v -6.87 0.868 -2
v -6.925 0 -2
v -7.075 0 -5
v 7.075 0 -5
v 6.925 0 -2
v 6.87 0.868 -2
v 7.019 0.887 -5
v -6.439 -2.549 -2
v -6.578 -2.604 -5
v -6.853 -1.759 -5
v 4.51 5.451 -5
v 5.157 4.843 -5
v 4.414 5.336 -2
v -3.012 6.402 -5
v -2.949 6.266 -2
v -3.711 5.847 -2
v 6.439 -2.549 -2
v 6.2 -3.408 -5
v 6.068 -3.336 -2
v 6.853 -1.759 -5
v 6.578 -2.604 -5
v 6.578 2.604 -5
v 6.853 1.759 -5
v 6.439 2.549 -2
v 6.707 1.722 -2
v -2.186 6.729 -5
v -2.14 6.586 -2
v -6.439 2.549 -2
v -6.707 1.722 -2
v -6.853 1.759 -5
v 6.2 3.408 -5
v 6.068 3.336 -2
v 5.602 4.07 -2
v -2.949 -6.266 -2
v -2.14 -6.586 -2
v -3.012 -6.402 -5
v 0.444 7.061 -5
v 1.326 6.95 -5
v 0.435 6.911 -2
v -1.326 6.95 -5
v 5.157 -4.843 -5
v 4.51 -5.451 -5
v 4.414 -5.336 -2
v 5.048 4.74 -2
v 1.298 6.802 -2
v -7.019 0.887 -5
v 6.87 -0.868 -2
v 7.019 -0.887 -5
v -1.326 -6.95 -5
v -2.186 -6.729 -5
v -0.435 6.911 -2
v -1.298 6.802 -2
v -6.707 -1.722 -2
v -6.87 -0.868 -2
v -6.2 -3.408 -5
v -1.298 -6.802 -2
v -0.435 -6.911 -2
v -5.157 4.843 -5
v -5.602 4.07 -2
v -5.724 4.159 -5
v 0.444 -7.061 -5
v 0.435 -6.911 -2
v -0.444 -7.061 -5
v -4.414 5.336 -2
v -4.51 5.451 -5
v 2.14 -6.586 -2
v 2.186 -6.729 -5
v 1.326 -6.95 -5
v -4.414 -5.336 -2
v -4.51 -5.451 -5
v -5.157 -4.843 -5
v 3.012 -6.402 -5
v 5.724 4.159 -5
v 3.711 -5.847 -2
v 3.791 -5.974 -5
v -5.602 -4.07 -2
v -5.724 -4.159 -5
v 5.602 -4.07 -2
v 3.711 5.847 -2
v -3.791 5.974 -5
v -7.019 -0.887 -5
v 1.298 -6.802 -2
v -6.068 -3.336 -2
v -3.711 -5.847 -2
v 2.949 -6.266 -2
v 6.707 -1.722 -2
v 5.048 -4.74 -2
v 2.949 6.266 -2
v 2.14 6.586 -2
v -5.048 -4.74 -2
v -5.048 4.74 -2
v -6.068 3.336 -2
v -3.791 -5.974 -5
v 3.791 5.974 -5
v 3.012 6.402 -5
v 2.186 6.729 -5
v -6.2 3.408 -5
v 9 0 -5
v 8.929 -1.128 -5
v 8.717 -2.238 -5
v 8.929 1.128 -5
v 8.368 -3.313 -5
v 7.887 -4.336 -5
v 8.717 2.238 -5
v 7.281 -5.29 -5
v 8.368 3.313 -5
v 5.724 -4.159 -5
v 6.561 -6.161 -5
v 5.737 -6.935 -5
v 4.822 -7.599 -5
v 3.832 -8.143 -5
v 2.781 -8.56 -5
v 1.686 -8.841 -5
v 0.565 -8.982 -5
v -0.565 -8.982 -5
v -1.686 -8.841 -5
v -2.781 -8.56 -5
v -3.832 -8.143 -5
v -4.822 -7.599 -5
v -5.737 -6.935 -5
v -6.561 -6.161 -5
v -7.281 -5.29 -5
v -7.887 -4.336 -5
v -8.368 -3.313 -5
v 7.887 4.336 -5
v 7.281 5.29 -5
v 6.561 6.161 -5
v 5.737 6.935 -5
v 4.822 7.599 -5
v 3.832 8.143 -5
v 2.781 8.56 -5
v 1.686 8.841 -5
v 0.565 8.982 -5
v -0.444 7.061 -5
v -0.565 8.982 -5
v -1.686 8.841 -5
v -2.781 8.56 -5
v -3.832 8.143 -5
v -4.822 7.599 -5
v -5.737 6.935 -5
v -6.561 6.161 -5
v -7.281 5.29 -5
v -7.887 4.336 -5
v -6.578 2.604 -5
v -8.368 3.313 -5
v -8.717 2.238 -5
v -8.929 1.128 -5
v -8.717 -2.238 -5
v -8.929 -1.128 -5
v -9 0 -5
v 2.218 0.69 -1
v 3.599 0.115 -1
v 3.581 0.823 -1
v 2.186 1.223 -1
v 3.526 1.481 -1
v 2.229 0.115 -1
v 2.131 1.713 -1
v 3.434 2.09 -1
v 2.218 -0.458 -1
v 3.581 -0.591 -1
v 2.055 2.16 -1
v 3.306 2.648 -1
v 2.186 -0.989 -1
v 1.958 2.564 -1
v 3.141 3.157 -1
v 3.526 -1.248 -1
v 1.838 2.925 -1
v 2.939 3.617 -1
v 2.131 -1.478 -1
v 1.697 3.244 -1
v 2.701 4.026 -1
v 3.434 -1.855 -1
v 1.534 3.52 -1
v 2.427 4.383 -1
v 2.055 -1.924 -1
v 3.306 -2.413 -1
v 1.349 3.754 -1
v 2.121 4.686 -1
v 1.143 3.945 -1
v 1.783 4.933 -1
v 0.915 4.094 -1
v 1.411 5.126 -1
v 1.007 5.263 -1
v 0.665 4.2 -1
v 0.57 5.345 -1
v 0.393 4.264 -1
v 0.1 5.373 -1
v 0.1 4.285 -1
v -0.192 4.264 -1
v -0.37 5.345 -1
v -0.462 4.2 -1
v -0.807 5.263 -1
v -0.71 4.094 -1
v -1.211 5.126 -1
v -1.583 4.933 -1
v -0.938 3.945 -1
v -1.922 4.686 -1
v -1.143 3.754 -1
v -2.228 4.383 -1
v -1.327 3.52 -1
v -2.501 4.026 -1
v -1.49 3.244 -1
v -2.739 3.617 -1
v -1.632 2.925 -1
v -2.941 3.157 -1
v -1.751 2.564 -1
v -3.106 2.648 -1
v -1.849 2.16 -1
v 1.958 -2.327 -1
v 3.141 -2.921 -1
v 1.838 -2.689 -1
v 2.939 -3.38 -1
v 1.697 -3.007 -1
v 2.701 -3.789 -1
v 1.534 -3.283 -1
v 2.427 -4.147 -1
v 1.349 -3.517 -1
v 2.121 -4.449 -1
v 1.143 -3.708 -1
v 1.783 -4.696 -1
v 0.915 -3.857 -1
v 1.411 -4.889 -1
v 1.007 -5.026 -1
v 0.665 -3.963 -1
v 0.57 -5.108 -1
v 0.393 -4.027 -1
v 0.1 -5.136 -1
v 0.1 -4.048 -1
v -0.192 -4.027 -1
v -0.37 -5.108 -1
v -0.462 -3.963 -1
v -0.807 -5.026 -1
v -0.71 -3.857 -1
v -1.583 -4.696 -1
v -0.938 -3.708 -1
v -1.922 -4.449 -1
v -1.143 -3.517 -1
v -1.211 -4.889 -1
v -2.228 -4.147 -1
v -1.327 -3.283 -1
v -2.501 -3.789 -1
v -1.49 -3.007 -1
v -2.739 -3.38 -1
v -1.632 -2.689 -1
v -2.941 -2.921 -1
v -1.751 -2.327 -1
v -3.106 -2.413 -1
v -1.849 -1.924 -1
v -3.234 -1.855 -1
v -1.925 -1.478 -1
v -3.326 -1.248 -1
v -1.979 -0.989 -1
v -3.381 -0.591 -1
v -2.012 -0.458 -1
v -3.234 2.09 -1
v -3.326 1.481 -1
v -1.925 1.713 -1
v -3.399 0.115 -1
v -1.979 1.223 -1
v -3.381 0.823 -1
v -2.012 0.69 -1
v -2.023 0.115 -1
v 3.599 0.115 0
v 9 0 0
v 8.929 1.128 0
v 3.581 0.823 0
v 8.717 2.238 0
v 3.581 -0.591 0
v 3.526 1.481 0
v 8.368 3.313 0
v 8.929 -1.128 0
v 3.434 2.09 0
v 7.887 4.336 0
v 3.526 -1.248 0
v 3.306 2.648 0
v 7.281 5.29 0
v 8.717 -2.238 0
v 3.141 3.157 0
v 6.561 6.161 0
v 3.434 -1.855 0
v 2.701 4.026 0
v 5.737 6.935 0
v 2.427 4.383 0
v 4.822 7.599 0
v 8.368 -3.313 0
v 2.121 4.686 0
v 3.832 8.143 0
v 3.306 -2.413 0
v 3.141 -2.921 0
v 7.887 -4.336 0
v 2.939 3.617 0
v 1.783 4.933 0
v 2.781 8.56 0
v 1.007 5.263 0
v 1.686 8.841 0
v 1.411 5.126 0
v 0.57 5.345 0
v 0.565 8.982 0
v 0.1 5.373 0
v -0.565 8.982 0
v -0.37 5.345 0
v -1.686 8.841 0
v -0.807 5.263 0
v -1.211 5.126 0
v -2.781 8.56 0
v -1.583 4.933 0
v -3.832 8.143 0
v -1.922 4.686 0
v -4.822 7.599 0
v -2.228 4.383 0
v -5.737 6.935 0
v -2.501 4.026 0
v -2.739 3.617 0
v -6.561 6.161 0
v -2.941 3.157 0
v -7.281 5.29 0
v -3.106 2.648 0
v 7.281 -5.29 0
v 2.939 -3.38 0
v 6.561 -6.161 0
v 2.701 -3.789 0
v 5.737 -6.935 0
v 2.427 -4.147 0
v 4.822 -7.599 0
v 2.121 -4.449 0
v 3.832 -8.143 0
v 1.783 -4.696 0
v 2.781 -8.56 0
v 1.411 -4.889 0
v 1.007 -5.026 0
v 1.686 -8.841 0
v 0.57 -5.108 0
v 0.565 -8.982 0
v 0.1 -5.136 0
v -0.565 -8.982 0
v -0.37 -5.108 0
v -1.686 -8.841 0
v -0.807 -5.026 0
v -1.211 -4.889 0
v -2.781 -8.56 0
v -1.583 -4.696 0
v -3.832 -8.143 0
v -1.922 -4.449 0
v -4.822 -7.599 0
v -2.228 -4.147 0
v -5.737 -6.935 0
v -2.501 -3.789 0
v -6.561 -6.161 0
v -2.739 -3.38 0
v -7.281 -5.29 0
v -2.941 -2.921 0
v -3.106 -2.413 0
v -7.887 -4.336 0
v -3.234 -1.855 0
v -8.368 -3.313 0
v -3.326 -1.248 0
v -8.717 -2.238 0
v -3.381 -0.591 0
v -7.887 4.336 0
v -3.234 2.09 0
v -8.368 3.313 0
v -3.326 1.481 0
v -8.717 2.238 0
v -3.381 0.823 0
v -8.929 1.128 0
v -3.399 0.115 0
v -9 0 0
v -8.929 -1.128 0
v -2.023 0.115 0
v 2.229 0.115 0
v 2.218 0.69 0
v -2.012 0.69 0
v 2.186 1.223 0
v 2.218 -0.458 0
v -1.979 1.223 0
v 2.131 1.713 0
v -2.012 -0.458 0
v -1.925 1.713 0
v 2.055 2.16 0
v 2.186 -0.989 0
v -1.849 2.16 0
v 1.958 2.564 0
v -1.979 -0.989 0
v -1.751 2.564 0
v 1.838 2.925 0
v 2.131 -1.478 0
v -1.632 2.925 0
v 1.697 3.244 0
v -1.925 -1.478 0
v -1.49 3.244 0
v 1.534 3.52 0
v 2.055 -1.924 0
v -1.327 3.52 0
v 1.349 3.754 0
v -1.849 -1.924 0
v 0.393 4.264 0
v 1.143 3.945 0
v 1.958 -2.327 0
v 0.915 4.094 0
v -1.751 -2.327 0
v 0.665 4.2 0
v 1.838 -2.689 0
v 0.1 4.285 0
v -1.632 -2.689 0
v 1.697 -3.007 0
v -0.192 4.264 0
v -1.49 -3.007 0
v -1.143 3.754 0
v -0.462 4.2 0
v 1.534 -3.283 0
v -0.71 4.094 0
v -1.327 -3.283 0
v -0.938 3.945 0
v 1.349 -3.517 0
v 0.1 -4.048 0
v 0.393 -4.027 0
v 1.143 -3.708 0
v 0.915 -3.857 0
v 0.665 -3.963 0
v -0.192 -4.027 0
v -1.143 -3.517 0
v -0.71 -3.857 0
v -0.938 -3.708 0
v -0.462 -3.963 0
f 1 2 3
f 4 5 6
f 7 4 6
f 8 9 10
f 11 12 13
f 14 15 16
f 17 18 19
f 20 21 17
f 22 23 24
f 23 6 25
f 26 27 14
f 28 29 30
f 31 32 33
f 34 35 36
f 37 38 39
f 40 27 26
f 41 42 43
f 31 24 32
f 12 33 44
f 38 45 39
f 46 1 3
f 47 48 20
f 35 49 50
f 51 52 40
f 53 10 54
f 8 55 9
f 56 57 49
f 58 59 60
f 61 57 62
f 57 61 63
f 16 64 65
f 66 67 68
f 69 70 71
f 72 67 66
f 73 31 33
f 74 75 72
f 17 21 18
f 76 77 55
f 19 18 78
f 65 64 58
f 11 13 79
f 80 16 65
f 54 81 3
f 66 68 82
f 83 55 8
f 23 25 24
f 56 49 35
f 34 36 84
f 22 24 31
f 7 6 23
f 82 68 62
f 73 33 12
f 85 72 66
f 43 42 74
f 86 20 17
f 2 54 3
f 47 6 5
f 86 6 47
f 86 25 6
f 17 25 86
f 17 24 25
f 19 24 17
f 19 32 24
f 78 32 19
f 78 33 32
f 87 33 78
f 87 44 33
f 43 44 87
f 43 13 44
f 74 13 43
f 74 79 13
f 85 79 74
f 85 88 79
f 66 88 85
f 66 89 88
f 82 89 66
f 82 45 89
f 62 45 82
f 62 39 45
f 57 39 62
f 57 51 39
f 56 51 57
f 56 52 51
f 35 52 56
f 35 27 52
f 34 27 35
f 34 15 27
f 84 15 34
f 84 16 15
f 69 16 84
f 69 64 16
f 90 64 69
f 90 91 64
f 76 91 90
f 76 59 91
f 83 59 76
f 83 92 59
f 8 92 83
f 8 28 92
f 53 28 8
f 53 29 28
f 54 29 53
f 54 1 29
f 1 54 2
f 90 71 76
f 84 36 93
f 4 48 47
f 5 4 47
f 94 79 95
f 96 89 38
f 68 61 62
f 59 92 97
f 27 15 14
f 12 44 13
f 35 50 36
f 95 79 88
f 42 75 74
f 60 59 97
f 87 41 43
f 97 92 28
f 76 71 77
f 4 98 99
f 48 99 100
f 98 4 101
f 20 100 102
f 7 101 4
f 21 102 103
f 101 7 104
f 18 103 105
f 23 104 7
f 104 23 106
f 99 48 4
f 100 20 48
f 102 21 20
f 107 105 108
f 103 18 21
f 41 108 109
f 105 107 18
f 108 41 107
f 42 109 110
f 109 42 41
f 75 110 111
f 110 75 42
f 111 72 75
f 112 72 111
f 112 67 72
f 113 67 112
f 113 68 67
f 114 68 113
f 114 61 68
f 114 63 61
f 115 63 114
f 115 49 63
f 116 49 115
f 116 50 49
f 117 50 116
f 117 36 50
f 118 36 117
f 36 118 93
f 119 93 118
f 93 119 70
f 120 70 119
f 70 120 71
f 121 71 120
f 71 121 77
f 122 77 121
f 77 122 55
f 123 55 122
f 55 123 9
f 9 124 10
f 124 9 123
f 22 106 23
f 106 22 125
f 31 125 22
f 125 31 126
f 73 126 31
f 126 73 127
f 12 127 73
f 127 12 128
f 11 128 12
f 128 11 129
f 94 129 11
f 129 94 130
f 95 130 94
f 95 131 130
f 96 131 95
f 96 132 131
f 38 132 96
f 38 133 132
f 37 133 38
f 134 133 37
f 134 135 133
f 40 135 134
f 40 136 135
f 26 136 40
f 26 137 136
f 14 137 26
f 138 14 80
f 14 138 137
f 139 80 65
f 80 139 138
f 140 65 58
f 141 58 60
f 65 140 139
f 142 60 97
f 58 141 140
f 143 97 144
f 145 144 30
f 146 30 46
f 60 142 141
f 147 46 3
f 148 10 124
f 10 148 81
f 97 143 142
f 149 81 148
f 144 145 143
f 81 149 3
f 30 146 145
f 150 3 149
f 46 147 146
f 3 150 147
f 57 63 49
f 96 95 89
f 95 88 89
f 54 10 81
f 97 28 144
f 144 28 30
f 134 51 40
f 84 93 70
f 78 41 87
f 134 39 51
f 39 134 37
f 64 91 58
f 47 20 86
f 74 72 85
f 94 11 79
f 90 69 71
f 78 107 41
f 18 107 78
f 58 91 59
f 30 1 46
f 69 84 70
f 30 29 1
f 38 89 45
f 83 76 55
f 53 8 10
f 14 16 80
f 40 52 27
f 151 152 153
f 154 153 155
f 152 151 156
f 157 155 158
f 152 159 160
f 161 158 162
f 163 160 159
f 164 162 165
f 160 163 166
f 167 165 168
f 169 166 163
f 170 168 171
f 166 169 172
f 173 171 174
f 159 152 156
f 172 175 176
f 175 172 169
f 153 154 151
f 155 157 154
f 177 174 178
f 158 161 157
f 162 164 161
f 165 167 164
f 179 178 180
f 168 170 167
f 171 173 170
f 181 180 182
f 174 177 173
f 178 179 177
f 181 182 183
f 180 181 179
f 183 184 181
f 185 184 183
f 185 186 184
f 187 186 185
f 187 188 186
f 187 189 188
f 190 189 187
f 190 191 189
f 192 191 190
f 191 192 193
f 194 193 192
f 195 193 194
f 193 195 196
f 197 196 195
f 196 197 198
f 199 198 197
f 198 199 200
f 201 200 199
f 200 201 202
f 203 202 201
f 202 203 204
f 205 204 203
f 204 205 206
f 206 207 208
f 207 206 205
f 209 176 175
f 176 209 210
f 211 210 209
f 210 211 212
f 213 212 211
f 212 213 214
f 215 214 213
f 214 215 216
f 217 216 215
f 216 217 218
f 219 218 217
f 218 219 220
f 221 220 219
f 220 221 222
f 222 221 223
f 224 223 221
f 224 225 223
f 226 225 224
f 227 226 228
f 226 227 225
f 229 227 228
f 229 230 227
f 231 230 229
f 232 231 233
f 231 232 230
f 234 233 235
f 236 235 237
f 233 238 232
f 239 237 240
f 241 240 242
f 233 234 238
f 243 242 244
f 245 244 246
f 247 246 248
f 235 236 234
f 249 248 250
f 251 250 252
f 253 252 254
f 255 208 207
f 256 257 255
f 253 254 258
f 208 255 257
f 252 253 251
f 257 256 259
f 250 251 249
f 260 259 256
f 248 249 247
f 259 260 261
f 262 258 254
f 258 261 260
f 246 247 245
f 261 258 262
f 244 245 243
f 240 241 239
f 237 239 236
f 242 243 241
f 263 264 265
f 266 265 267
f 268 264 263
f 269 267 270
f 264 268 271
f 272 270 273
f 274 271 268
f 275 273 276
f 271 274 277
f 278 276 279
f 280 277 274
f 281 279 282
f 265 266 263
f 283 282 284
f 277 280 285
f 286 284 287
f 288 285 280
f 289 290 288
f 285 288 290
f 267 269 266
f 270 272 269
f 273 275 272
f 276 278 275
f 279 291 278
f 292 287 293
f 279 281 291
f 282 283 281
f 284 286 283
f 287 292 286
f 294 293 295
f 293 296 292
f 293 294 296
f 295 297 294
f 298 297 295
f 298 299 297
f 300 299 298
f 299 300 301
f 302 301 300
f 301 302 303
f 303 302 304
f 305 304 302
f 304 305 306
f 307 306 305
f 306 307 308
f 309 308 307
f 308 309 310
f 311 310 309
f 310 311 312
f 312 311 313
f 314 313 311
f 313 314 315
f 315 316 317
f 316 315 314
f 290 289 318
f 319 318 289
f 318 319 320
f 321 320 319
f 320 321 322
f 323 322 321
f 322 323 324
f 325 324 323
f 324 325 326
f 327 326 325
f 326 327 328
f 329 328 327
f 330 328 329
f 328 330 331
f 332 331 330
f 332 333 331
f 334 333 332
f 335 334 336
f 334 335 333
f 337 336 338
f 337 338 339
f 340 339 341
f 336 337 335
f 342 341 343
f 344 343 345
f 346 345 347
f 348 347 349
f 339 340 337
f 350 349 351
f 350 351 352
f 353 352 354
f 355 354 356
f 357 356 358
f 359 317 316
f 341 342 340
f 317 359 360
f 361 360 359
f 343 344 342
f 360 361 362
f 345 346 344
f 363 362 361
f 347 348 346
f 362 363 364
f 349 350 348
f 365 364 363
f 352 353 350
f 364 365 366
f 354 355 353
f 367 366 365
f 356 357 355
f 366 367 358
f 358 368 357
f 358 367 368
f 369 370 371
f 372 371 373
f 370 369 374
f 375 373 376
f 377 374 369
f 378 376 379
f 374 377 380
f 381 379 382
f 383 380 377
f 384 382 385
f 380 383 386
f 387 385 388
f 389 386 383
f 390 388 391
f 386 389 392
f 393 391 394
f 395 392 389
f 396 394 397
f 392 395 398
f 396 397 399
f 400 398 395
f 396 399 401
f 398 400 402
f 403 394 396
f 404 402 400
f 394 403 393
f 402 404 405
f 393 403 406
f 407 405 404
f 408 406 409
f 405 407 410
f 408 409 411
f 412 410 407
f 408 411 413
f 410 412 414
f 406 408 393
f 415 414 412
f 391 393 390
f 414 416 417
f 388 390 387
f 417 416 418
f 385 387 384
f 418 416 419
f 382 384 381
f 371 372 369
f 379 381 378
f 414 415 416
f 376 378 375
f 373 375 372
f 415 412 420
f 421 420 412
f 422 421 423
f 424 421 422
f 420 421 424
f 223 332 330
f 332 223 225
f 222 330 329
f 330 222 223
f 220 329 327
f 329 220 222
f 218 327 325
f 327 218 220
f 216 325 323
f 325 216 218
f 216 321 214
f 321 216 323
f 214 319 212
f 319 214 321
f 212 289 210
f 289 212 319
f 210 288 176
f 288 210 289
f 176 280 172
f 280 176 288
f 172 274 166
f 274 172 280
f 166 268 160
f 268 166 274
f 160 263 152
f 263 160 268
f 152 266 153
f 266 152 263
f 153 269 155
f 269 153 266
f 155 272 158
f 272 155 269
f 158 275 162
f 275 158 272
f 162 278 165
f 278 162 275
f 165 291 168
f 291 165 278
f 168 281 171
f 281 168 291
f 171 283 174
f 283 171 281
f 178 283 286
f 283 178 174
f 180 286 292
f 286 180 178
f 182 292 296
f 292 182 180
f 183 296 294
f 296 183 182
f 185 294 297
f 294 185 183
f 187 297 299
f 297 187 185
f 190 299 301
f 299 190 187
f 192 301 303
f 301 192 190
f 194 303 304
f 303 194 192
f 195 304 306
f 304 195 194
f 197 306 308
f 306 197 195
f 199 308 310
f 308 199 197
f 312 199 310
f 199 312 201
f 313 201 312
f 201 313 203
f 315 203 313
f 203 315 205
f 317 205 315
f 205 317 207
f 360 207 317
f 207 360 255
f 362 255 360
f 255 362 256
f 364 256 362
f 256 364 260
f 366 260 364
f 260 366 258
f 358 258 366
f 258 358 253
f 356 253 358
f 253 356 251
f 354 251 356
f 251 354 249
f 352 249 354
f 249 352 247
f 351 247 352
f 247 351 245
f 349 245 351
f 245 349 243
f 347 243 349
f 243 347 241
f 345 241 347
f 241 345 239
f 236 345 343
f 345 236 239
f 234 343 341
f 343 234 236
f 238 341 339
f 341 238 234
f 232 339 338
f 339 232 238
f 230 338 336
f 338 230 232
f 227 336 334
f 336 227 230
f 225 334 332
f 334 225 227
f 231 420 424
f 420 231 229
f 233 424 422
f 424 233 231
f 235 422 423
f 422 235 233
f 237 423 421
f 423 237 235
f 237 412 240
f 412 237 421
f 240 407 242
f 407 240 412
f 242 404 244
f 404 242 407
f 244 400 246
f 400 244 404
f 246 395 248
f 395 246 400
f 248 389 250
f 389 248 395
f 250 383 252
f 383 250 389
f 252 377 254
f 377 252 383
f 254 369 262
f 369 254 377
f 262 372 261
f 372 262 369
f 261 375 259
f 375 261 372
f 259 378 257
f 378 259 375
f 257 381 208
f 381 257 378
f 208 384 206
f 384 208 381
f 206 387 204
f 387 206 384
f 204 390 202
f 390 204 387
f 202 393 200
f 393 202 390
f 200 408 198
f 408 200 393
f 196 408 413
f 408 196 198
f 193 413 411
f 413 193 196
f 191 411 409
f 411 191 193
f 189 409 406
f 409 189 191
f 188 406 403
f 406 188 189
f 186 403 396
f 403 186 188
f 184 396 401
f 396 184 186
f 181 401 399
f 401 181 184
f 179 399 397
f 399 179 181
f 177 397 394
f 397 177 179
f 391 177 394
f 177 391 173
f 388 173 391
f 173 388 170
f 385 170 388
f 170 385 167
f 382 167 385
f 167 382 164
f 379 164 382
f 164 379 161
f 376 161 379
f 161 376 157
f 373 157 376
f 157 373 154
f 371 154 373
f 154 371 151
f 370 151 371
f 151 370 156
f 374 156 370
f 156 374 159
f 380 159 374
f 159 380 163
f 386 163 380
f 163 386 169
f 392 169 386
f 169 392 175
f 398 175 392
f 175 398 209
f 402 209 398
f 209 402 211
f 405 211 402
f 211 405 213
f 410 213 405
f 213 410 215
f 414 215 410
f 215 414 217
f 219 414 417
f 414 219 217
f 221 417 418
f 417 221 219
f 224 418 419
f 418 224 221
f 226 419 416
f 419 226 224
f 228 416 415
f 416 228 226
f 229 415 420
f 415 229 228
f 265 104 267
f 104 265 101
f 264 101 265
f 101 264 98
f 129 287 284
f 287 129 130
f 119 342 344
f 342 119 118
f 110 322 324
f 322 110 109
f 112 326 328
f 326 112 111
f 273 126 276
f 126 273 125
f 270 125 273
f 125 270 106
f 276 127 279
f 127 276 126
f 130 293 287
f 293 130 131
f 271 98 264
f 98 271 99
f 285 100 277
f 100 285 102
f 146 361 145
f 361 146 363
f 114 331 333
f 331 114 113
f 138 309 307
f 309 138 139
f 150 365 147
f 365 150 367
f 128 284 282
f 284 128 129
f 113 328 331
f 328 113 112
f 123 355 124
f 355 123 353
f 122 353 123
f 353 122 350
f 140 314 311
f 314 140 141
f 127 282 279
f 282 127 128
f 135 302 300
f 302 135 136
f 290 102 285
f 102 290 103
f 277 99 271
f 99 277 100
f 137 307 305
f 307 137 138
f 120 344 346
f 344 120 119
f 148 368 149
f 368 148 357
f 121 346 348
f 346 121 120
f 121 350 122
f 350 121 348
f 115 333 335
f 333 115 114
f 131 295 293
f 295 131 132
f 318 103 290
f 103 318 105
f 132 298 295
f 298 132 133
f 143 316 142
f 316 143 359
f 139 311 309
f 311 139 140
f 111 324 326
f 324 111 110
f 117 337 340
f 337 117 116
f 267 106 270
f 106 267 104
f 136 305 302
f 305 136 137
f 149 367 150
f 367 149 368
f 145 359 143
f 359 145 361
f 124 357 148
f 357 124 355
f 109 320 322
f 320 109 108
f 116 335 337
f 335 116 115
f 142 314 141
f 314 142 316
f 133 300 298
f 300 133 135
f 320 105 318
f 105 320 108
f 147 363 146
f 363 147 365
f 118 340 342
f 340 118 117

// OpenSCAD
$fn = 50;

difference() {
	union() {
		translate(v = [0, 0, -5.0]) {
			cylinder(h = 5, r = 9.0);
		}
	}
	union() {
		#translate(v = [0, 0, -5.0]) {
			cylinder(h = 3, r1 = 7.075, r2 = 6.925);
		}
		translate(v = [0, 0, -1]) {
			linear_extrude(height = 1) {
				text(font = "Impact", halign = "center", size = 10, text = "0", valign = "center");
			}
		}
	}
}
